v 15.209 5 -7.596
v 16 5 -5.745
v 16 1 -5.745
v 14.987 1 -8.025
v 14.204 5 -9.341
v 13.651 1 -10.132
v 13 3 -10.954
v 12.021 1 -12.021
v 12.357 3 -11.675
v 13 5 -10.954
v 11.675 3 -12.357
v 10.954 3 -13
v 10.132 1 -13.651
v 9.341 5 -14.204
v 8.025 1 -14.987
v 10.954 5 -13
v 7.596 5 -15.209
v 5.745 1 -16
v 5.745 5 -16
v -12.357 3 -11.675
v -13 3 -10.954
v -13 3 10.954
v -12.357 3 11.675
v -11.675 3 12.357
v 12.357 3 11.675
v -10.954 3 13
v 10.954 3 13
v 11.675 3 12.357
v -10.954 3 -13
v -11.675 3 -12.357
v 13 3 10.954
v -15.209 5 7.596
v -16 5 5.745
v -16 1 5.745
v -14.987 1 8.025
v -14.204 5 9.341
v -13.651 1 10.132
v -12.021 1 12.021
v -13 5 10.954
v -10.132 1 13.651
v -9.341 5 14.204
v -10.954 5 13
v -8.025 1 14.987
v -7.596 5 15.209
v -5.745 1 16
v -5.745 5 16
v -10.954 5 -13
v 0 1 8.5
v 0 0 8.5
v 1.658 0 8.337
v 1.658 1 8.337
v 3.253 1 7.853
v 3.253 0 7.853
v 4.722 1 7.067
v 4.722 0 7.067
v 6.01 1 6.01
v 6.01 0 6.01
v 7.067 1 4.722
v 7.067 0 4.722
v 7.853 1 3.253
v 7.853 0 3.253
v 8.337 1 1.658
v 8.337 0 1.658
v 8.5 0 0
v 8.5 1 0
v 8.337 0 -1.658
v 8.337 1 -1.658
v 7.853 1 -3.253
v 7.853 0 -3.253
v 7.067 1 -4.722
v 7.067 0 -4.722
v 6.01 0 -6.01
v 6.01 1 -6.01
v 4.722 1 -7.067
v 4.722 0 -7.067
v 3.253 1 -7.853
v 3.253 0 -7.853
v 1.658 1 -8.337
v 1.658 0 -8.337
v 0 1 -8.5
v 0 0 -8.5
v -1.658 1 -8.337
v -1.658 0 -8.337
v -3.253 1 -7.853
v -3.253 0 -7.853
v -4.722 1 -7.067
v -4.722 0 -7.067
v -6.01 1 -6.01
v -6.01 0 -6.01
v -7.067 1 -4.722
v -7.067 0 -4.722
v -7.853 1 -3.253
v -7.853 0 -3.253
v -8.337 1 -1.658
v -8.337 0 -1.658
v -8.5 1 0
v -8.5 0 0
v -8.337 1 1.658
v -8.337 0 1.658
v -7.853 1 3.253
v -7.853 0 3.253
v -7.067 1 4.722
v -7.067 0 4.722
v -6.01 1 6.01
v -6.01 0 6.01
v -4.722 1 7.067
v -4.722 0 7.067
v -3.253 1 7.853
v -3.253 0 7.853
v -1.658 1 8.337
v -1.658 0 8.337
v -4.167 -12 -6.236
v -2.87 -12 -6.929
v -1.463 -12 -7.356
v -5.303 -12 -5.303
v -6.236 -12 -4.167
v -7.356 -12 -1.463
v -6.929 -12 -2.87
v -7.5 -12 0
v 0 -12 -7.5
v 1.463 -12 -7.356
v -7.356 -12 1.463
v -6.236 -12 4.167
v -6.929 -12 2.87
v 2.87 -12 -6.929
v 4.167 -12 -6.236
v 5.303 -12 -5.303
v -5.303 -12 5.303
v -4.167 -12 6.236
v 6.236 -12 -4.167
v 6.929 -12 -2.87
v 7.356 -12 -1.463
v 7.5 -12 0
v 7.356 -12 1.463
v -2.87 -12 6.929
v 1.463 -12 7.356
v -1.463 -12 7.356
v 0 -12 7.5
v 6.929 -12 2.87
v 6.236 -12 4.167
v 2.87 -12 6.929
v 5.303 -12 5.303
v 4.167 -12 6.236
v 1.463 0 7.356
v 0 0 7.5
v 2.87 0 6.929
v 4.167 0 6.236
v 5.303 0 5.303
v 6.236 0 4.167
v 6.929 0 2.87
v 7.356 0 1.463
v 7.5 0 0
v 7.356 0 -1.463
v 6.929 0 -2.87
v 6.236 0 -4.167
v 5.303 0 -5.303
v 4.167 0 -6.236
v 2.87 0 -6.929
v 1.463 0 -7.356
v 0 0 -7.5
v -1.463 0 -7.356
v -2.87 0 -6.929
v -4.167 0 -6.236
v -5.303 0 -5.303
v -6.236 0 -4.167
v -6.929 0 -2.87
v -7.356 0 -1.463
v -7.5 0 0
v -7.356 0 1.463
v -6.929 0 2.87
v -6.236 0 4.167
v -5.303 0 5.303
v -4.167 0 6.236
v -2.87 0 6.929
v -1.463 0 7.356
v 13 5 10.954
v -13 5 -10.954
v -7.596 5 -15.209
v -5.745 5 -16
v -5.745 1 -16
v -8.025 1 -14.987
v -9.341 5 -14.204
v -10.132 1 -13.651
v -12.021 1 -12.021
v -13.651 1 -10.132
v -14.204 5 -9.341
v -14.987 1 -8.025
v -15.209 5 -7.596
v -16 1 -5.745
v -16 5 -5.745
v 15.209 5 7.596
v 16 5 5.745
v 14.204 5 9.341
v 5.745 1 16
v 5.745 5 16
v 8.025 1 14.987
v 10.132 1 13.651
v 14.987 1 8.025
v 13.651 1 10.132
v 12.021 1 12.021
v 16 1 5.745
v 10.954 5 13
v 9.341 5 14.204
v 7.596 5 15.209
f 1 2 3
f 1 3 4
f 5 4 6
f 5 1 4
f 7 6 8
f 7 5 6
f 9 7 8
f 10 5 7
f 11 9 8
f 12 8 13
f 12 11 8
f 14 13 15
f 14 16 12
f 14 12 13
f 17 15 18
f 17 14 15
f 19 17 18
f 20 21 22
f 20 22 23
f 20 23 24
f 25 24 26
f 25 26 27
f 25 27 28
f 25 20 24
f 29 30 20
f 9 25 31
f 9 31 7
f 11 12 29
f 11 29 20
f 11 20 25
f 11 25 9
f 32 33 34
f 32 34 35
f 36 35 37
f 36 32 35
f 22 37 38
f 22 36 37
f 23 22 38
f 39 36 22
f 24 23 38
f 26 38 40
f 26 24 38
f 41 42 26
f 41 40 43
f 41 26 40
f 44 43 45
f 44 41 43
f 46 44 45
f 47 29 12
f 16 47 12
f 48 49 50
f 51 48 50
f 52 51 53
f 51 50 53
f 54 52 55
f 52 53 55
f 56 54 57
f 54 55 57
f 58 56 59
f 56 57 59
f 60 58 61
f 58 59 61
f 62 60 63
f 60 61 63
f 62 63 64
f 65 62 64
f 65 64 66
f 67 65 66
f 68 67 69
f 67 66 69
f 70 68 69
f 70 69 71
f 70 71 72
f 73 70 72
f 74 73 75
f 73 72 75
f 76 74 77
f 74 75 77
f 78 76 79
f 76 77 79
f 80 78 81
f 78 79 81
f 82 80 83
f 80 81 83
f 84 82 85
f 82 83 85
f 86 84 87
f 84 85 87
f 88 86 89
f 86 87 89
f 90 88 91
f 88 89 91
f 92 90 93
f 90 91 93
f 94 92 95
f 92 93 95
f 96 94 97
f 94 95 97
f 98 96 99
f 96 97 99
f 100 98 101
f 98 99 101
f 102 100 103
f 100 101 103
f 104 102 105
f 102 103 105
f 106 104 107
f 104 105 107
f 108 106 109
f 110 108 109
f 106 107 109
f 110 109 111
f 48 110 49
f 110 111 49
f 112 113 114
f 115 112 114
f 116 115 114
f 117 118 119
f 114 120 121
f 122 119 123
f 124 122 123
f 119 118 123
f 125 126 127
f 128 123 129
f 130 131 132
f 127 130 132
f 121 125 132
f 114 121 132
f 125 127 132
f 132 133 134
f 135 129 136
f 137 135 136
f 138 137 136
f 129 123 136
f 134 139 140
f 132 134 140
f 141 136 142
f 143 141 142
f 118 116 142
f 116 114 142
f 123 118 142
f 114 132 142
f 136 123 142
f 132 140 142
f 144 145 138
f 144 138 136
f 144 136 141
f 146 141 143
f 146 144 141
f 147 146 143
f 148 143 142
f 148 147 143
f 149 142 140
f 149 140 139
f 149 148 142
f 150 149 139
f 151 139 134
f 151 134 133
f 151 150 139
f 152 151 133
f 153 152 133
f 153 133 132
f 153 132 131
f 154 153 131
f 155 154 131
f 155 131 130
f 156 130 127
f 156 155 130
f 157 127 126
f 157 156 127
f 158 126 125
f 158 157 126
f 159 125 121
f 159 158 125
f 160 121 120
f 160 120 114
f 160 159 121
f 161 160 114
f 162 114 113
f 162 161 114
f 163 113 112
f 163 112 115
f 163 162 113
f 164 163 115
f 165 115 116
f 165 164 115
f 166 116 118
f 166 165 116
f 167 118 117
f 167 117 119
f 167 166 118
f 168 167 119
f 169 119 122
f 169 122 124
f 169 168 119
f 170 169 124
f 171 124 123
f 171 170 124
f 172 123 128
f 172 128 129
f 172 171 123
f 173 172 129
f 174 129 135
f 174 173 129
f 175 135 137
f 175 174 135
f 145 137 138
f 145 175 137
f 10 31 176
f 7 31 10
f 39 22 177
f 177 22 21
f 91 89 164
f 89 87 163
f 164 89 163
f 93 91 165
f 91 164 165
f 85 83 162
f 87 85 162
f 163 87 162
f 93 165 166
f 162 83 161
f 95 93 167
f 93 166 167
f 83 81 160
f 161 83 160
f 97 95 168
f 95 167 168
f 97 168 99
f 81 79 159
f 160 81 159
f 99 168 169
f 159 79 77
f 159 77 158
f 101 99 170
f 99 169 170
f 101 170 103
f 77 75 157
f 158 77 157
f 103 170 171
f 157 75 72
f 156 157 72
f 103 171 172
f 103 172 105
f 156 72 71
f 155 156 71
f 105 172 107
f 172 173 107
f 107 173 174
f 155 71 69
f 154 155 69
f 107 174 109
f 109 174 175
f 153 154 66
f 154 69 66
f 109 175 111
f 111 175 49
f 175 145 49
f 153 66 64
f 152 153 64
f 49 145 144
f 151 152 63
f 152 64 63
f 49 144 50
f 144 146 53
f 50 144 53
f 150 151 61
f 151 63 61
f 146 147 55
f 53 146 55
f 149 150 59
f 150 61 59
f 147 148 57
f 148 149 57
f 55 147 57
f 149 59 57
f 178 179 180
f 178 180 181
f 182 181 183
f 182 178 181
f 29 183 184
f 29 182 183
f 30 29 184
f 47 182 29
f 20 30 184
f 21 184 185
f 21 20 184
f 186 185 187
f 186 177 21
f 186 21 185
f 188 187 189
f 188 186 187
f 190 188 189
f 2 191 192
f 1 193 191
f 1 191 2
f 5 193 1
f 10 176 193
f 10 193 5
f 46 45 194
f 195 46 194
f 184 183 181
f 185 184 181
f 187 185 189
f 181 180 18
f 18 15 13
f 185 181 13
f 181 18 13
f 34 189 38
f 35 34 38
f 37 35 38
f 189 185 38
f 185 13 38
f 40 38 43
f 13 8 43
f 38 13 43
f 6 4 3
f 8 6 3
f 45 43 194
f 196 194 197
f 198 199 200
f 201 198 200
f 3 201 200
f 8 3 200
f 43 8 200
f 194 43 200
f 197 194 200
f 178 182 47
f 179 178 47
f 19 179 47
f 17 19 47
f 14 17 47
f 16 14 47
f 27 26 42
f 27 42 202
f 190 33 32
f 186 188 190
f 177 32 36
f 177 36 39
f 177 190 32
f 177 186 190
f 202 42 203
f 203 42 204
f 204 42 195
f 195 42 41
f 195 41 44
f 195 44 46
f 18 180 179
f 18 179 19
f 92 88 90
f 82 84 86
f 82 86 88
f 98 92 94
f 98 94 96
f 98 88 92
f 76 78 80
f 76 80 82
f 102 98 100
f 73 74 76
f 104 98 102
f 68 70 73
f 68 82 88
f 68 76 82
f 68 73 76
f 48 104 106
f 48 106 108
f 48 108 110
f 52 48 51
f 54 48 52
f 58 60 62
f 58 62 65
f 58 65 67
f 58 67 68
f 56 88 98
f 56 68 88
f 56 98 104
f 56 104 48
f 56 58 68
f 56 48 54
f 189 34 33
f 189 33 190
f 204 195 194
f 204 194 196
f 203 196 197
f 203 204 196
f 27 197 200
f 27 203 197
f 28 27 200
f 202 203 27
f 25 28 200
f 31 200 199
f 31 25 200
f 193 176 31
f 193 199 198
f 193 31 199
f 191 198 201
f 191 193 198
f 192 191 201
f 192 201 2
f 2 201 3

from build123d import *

# Parameters (mm, degrees)
ESQUISSE1_R             = 7.5
BOSS_EXTRU_1_DEPTH      = 12
ESQUISSE2_R             = 8.5
BOSS_EXTRU_2_DEPTH      = 1
ESQUISSE3_W             = 32
ESQUISSE3_H             = 32
ESQUISSE3_W_2           = 26
ESQUISSE3_H_2           = 26
ESQUISSE3_R             = 8.5
BOSS_EXTRU_3_DEPTH      = 2
ESQUISSE4_W             = 32
ESQUISSE4_H             = 32
ESQUISSE4_W_2           = 26
ESQUISSE4_H_2           = 26
BOSS_EXTRU_4_DEPTH      = 2
ESQUISSE6_R             = 32.523409814
ESQUISSE6_R_2           = 17
ENL_V_MAT_EXTRU_1_DEPTH = 29.301943396


with BuildPart() as part:
    # Esquisse1 → Boss.-Extru.1 (new body)
    with BuildSketch(Plane(origin=(0, 0, 0), x_dir=(1, 0, 0), z_dir=(0, 1, 0))):
        with Locations(Location((0, 0, 0), (0, 0, 270))):
            Circle(ESQUISSE1_R)
    extrude(amount=-BOSS_EXTRU_1_DEPTH)

    # Esquisse2 → Boss.-Extru.2 (add)
    with BuildSketch(Plane(origin=(0, 0, 0), x_dir=(1, 0, 0), z_dir=(0, 1, 0))):
        with Locations(Location((0, 0, 0), (0, 0, 270))):
            Circle(ESQUISSE2_R)
    extrude(amount=BOSS_EXTRU_2_DEPTH)


with BuildPart() as body_2:
    # Esquisse3 → Boss.-Extru.3 (new body)
    # profile 1 of 3: a face of its own
    with BuildSketch(Plane(origin=(0, 1, 0), x_dir=(1, 0, 0), z_dir=(0, 1, 0))):
        Rectangle(ESQUISSE3_W, ESQUISSE3_H)
        Rectangle(ESQUISSE3_W_2, ESQUISSE3_H_2, mode=Mode.SUBTRACT)
    # profile 2 of 3: a face of its own
    with BuildSketch(Plane(origin=(0, 1, 0), x_dir=(1, 0, 0), z_dir=(0, 1, 0))):
        Rectangle(ESQUISSE3_W_2, ESQUISSE3_H_2)
        with Locations(Location((0, 0, 0), (0, 0, 270))):
            Circle(ESQUISSE3_R, mode=Mode.SUBTRACT)
    # profile 3 of 3: a face of its own
    with BuildSketch(Plane(origin=(0, 1, 0), x_dir=(1, 0, 0), z_dir=(0, 1, 0))):
        with Locations(Location((0, 0, 0), (0, 0, 270))):
            Circle(ESQUISSE3_R)
    extrude(amount=BOSS_EXTRU_3_DEPTH)

    # Esquisse4 → Boss.-Extru.4 (add)
    with BuildSketch(Plane(origin=(0, 3, 0), x_dir=(1, 0, 0), z_dir=(0, 1, 0))):
        Rectangle(ESQUISSE4_W, ESQUISSE4_H)
        Rectangle(ESQUISSE4_W_2, ESQUISSE4_H_2, mode=Mode.SUBTRACT)
    extrude(amount=BOSS_EXTRU_4_DEPTH)

    # Esquisse6 → Enlèv. mat.-Extru.1 (cut, through all)
    with BuildSketch(Plane(origin=(0, 5, 0), x_dir=(1, 0, 0), z_dir=(0, 1, 0))):
        Circle(ESQUISSE6_R)
        Circle(ESQUISSE6_R_2, mode=Mode.SUBTRACT)
    extrude(amount=-ENL_V_MAT_EXTRU_1_DEPTH, mode=Mode.SUBTRACT)


solid = Compound([part.part, body_2.part])
